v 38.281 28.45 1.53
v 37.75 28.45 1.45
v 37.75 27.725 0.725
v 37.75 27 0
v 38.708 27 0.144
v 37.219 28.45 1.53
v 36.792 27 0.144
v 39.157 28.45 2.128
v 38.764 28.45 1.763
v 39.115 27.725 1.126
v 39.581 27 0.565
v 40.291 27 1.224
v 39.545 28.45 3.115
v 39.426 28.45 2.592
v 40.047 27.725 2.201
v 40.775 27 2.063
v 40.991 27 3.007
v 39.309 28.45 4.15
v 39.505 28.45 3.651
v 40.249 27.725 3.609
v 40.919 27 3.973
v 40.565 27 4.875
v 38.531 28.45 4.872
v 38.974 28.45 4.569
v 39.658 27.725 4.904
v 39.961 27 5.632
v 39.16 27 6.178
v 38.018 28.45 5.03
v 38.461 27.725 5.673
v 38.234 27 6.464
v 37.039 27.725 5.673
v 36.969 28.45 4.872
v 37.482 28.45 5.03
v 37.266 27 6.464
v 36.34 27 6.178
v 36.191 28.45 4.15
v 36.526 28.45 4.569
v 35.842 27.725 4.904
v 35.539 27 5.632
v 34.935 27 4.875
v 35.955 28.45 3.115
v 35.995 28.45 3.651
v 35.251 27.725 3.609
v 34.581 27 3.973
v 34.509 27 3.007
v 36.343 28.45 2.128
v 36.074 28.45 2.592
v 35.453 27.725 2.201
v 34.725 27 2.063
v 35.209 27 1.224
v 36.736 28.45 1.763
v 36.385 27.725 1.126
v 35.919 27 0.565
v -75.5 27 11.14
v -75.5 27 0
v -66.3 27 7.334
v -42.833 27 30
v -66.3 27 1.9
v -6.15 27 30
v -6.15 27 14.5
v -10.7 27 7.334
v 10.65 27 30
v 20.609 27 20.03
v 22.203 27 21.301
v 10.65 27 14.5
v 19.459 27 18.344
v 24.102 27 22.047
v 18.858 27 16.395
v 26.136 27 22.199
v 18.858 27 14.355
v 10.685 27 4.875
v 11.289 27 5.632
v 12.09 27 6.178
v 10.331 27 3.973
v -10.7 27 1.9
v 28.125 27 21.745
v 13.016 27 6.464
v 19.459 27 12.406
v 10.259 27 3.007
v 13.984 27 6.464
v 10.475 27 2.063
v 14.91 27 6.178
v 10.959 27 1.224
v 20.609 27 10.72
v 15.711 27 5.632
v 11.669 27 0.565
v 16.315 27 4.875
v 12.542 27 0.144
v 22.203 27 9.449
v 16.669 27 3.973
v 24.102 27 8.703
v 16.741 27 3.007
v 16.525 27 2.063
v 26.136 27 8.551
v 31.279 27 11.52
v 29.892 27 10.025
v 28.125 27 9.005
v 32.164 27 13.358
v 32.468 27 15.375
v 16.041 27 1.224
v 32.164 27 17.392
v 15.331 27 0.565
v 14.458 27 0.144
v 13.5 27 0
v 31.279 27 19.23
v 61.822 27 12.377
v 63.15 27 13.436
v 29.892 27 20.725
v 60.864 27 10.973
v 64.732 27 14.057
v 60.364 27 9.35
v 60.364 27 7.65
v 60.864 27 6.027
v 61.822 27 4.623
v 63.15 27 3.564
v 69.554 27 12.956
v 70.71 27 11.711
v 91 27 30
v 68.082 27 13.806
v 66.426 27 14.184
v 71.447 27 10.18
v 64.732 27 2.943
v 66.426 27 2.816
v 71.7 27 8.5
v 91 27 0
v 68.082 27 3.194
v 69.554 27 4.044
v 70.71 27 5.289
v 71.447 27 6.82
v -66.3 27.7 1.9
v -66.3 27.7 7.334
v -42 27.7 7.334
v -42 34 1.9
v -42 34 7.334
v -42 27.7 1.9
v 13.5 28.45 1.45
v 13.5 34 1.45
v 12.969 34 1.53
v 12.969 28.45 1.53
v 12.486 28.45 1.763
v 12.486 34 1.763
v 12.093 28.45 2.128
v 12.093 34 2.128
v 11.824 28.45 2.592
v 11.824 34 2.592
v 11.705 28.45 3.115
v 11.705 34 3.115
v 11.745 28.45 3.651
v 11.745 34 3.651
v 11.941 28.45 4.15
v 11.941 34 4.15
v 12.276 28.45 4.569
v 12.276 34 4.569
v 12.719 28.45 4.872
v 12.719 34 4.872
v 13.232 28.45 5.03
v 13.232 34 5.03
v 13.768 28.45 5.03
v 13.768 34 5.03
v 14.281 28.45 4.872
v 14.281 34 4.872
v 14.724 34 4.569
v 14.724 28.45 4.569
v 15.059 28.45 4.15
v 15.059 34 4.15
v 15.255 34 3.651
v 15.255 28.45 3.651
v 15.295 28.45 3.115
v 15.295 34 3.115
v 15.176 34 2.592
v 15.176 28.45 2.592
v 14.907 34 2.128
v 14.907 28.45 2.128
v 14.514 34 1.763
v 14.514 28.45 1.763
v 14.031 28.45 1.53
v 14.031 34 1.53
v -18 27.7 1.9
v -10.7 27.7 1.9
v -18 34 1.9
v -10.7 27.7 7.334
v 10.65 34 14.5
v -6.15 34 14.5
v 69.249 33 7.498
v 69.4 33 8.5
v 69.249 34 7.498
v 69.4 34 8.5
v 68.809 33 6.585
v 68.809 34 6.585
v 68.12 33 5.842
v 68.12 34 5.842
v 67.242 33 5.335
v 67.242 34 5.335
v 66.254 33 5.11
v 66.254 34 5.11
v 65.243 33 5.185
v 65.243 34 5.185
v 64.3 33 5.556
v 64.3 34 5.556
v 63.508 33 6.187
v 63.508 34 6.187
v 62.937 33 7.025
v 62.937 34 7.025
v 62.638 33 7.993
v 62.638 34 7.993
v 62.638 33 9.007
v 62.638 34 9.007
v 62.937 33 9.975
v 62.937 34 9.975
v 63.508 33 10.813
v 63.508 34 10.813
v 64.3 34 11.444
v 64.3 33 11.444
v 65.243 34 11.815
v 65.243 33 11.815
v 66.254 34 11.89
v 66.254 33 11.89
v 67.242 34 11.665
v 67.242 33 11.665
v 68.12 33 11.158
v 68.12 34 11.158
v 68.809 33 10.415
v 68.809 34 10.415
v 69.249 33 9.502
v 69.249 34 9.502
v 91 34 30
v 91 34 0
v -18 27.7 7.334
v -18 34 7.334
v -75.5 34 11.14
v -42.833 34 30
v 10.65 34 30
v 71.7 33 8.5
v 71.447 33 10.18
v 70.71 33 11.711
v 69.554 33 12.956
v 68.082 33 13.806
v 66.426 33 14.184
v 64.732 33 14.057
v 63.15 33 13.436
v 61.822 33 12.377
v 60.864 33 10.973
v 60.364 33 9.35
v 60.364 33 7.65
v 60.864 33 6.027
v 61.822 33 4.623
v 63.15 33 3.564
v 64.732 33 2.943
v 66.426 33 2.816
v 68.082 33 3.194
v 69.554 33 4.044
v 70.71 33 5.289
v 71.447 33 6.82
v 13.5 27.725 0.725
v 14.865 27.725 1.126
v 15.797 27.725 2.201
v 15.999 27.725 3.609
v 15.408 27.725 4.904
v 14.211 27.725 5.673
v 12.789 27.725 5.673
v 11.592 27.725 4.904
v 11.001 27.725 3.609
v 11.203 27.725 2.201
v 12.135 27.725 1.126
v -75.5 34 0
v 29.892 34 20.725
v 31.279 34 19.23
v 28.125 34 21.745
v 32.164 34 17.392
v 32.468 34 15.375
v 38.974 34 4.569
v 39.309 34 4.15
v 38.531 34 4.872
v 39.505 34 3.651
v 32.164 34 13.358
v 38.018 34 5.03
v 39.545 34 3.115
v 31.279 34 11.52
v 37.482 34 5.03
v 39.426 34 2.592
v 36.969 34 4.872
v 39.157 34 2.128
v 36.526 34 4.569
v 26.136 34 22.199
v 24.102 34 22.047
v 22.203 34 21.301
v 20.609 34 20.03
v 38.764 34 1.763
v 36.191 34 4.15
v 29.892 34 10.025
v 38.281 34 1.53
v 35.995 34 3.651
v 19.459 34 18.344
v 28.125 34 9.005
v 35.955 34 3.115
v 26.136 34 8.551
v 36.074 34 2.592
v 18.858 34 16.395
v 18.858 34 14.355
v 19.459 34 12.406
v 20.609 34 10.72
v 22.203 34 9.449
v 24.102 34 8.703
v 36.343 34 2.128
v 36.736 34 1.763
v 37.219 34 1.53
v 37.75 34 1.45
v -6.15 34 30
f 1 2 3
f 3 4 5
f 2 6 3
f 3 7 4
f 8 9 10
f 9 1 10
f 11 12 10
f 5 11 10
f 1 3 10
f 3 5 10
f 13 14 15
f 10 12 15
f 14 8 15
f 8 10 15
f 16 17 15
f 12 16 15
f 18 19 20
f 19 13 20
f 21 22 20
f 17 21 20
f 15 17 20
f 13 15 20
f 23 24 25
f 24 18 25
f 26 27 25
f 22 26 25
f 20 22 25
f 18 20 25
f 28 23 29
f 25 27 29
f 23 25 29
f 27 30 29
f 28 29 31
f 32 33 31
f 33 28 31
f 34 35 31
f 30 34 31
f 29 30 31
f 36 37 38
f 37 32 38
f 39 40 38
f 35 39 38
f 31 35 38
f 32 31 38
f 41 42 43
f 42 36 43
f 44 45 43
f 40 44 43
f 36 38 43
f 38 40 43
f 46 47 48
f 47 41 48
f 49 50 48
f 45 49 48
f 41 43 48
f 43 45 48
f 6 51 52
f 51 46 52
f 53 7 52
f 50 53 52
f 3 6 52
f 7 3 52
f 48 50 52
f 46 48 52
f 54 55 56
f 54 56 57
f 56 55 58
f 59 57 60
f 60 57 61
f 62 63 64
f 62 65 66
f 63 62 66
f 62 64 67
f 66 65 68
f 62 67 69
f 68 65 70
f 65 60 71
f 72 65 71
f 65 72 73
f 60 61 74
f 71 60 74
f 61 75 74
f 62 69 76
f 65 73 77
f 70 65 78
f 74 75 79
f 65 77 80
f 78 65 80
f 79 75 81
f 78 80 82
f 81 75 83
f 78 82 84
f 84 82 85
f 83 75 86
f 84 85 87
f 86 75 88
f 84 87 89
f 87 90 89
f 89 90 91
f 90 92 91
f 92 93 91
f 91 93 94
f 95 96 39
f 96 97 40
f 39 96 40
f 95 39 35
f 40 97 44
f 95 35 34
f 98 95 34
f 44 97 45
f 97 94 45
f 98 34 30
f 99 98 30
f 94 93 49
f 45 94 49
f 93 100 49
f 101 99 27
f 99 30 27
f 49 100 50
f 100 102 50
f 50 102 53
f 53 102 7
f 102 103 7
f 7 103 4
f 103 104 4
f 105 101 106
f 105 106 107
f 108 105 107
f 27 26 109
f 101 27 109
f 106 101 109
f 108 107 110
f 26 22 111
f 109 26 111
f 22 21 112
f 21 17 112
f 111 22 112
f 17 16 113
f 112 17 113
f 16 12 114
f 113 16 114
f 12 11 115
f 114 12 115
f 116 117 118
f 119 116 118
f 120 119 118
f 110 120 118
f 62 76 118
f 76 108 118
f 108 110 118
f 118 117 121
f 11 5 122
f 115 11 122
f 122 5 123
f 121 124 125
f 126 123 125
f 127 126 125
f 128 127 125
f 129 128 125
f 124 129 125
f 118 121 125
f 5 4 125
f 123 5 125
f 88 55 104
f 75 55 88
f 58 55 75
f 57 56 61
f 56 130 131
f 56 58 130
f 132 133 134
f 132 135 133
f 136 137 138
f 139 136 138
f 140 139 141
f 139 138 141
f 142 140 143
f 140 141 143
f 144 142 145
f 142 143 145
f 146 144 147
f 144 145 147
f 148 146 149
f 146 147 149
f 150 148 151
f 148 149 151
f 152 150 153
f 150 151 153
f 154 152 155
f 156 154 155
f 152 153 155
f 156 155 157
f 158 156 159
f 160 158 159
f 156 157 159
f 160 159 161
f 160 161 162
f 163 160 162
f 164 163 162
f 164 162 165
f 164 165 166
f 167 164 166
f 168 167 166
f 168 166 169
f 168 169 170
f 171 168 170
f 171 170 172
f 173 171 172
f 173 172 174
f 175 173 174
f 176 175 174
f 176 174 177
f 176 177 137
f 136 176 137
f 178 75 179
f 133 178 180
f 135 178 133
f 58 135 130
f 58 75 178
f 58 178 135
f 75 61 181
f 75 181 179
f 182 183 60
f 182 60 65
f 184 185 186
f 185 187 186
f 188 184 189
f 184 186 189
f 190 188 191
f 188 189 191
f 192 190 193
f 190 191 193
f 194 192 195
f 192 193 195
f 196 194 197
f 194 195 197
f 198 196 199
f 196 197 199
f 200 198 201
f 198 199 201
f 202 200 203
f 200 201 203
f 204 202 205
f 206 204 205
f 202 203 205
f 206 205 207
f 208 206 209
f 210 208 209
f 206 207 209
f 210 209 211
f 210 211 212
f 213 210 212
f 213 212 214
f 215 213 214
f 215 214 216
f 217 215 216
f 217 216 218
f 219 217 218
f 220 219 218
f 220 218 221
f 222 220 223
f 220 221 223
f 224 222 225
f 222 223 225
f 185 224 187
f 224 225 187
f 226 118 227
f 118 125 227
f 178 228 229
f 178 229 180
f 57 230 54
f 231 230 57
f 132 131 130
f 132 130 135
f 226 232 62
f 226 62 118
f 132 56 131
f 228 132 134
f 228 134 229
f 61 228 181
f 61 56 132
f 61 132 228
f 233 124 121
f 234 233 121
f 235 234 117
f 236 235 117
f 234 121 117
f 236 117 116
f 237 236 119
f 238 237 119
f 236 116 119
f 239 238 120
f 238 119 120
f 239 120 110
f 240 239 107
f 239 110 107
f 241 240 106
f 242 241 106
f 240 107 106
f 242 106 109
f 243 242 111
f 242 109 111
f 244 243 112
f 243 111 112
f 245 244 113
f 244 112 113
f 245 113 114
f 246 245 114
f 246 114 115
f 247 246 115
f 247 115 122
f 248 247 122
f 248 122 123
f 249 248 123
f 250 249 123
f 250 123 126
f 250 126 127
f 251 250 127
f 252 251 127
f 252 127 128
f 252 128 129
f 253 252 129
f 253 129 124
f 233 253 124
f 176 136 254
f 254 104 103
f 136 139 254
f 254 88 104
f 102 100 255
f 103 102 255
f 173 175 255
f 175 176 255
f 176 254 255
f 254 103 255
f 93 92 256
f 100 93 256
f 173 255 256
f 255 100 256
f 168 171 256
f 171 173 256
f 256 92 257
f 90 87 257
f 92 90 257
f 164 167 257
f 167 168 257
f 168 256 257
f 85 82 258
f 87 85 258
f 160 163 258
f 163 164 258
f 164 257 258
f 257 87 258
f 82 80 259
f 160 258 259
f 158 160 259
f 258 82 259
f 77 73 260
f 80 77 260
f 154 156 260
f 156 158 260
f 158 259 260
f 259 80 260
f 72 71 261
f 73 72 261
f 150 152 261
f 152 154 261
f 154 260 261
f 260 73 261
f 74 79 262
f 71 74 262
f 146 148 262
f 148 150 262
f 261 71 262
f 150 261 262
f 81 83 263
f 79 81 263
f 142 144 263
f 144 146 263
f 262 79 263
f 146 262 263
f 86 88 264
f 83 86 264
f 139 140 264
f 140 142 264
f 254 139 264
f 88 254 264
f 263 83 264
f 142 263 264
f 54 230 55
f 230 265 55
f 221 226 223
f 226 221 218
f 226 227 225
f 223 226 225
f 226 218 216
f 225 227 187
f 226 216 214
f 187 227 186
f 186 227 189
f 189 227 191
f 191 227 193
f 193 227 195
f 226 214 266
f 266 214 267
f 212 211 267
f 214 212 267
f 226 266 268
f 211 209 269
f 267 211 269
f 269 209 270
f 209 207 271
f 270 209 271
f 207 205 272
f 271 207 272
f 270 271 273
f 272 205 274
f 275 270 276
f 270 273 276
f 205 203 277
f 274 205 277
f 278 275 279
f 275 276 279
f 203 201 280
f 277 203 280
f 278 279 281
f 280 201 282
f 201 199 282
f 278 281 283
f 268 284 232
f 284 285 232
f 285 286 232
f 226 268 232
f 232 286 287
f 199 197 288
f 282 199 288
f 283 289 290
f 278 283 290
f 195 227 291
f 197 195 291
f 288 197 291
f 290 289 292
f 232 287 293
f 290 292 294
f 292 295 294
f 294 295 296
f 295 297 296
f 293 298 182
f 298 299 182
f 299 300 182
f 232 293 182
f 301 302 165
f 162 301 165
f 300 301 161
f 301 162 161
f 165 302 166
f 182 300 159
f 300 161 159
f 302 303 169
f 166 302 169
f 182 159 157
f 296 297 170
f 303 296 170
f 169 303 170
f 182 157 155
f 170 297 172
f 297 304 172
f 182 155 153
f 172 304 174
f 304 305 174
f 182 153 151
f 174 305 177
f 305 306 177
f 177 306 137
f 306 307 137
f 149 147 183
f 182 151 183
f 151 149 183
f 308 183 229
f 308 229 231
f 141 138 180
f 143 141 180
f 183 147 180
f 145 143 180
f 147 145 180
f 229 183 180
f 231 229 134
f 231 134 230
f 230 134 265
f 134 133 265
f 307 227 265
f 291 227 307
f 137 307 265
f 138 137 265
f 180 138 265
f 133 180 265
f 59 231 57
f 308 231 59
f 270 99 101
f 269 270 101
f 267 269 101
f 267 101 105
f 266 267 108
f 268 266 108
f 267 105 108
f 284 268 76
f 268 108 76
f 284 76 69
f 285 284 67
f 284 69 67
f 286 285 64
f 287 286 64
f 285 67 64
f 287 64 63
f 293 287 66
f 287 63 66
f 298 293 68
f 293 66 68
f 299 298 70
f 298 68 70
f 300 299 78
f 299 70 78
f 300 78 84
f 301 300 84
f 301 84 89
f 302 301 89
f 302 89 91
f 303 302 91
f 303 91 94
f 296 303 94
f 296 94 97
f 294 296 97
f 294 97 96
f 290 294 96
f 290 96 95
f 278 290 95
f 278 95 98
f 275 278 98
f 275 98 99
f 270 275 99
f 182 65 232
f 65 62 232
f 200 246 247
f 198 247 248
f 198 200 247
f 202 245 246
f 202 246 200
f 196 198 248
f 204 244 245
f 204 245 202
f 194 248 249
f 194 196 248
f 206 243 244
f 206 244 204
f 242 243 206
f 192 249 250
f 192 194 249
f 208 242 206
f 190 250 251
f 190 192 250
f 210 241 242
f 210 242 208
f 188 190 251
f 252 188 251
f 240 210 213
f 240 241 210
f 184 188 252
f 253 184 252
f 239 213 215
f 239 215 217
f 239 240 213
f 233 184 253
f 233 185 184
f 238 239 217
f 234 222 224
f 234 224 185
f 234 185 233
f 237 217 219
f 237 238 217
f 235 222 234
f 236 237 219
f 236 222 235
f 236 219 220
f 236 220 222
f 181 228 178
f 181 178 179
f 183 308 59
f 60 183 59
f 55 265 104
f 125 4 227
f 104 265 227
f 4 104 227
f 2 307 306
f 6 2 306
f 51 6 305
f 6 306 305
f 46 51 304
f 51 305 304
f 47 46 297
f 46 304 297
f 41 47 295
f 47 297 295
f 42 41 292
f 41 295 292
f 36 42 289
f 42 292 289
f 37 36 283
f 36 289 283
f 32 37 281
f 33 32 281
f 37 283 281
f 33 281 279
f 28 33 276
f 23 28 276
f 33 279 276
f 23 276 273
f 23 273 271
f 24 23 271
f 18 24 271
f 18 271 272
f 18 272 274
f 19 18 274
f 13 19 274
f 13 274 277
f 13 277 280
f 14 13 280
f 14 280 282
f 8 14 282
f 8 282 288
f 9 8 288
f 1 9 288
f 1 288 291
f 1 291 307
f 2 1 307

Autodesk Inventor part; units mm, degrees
ref_plane "YZ Plane" through (0, 0, 0) normal (1, 0, 0) x (0, 1, 0)
ref_plane "XZ Plane" through (0, 0, 0) normal (0, 1, 0) x (-1, 0, 0)
ref_plane "XY Plane" through (0, 0, 0) normal (0, 0, 1) x (1, 0, 0)
sketch "Sketch1" plane through (0, 0, 0) normal (0, 0, 1) x (1, 0, 0)
  line L0 (91, -34) -> (91, 34) projected
  line L1 (91, 34) -> (41, 34) projected
  line L2 (41, 34) -> (41, 89) projected
  line L3 (41, 89) -> (-91, 89) projected
  line L4 (-91, 89) -> (-91, -89) projected
  line L5 (-91, -89) -> (41, -89) projected
  line L6 (41, -89) -> (41, -34) projected
  line L7 (41, -34) -> (91, -34) projected
  line L8 (70, 27) -> (62, 27) projected
  line L9 (91, 34) -> (-87, 34)
  line L10 (-87, 34) -> (-87, 27)
  line L11 (-87, 27) -> (91, 27)
  line L12 (91, 27) -> (91, 34)
  circle A0 centre (-83, 21.5) radius 1.2295 projected
  circle A1 centre (-83, -64.5) radius 1.2295 projected
  circle A2 centre (-83, -21.5) radius 1.2295 projected
  circle A3 centre (-83, 64.5) radius 1.2295 projected
  line L13 (-85, -72) -> (-76, -72) projected
  line L14 (-76, -72) -> (-76, -57) projected
  line L15 (-76, -57) -> (-85, -57) projected
  arc A4 (-87, -55) -> (-85, -57) centre (-85, -55) ccw projected
  line L16 (-87, -55) -> (-87, -31) projected
  arc A5 (-85, -29) -> (-87, -31) centre (-85, -31) ccw projected
  line L17 (-85, -29) -> (-76, -29) projected
  line L18 (-76, -29) -> (-76, -14) projected
  line L19 (-76, -14) -> (-85, -14) projected
  arc A6 (-87, -12) -> (-85, -14) centre (-85, -12) ccw projected
  line L20 (-87, -12) -> (-87, 12) projected
  arc A7 (-85, 14) -> (-87, 12) centre (-85, 12) ccw projected
  line L21 (-85, 14) -> (-76, 14) projected
  line L22 (-76, 14) -> (-76, 29) projected
  line L23 (-76, 29) -> (-85, 29) projected
  arc A8 (-87, 31) -> (-85, 29) centre (-85, 31) ccw projected
  line L24 (-87, 31) -> (-87, 55) projected
  arc A9 (-85, 57) -> (-87, 55) centre (-85, 55) ccw projected
  line L25 (-85, 57) -> (-76, 57) projected
  line L26 (-76, 57) -> (-76, 72) projected
  line L27 (-76, 72) -> (-85, 72) projected
  arc A10 (-87, 74) -> (-85, 72) centre (-85, 74) ccw projected
  line L28 (-87, 74) -> (-87, 89) projected
  line L29 (-91, 89) -> (-87, 89) projected
  line L30 (-91, -89) -> (-91, 89) projected
  line L31 (-91, -89) -> (-87, -89) projected
  line L32 (-87, -89) -> (-87, -74) projected
  arc A11 (-85, -72) -> (-87, -74) centre (-85, -74) ccw projected
  line L33 (-91, 89.5) -> (-86.5, 89.5)
  line L34 (-86.5, 89.5) -> (-86.5, 74)
  arc A12 (-86.5, 74) -> (-85, 72.5) centre (-85, 74) ccw
  line L35 (-85, 72.5) -> (-75.5, 72.5)
  line L36 (-75.5, 72.5) -> (-75.5, 56.5)
  line L37 (-75.5, 56.5) -> (-85, 56.5)
  arc A13 (-85, 56.5) -> (-86.5, 55) centre (-85, 55) ccw
  line L38 (-86.5, 55) -> (-86.5, 31)
  arc A14 (-86.5, 31) -> (-85, 29.5) centre (-85, 31) ccw
  line L39 (-85, 29.5) -> (-75.5, 29.5)
  line L40 (-75.5, 29.5) -> (-75.5, 13.5)
  line L41 (-75.5, 13.5) -> (-85, 13.5)
  arc A15 (-85, 13.5) -> (-86.5, 12) centre (-85, 12) ccw
  line L42 (-86.5, 12) -> (-86.5, -12)
  arc A16 (-86.5, -12) -> (-85, -13.5) centre (-85, -12) ccw
  line L43 (-85, -13.5) -> (-75.5, -13.5)
  line L44 (-75.5, -13.5) -> (-75.5, -29.5)
  line L45 (-75.5, -29.5) -> (-85, -29.5)
  arc A17 (-85, -29.5) -> (-86.5, -31) centre (-85, -31) ccw
  line L46 (-86.5, -31) -> (-86.5, -55)
  arc A18 (-86.5, -55) -> (-85, -56.5) centre (-85, -55) ccw
  line L47 (-85, -56.5) -> (-75.5, -56.5)
  line L48 (-75.5, -56.5) -> (-75.5, -72.5)
  line L49 (-75.5, -72.5) -> (-85, -72.5)
  arc A19 (-85, -72.5) -> (-86.5, -74) centre (-85, -74) ccw
  line L50 (-86.5, -74) -> (-86.5, -89.5)
  line L51 (-86.5, -89.5) -> (-91, -89.5)
  line L52 (-86.5, 31) -> (-75.5, 31)
  line L53 (-75.5, 31) -> (-75.5, 29.5)
  line L54 (-75.5, 31) -> (-75.5, 34)
  point P0 (0, 0)
  point P1 (-75.5, 27)
  point P2 (-86.5, 34)
  dimension "d6" = 0.5
extrude "Extrusion1" add sketch "Sketch1" along normal blind 30 contours L11 L8 L40 L53 L54 L9 L1 L0
sketch "Sketch3" plane through (-86.5, 34, 0) normal (0, 1, 0) x (1, 0, 0)
  line L0 (-0.5, -4.5) -> (-0.5, 0) projected
  line L1 (-0.5, 0) -> (-4.5, 0) projected
  line L2 (-4.5, 0) -> (-4.5, 3.5) projected
  line L3 (-4.5, 3.5) -> (-18.5, 3.5) projected
  line L4 (-18.5, 3.5) -> (-4.5, -5.5) projected
  line L5 (-4.5, -5.5) -> (-4.5, -4.5) projected
  line L6 (-4.5, -4.5) -> (-0.5, -4.5) projected
  line L7 (-0.5, -4.5) -> (50.0525, -33.6865)
  line L8 (177.5, 0) -> (11, 0) projected
  line L9 (177.5, -30) -> (11, -30) projected
  line L10 (177.5, 0) -> (177.5, -30) projected
  line L11 (11, 0) -> (11, -30) projected
  point P0 (86.5, 0)
  point P1 (43.6673, -30)
  point P2 (11, -11.1395)
  dimension "d7" = 30
extrude "Extrusion4" cut sketch "Sketch3" against normal blind 30 contours L7 L9 L11
sketch "Sketch5" plane through (-75.5, 27, 0) normal (0, -1, 0) x (1, 0, 0)
  line L0 (56.5, 7.0341) -> (57.5, 7.0341) projected
  line L1 (34.5, 7.0341) -> (56.5, 7.0341) projected
  line L2 (33.5, 7.0341) -> (33.5, 6.6226)
  line L3 (33.5, 6.6226) -> (9.5, 6.6226)
  line L4 (9.5, 6.6226) -> (9.5, 7.0341)
  line L5 (9.5, 7.0341) -> (33.5, 7.0341)
  line L6 (64.5, 7.0341) -> (64.5, 6.6226)
  line L7 (64.5, 6.6226) -> (57.5, 6.6226)
  line L8 (57.5, 6.6226) -> (57.5, 7.0341)
  line L9 (57.5, 7.0341) -> (64.5, 7.0341)
  line L10 (9.5, 2) -> (9.5, 2.6226)
  line L11 (9.5, 2.6226) -> (64.5, 2.6226)
  line L12 (64.5, 2.6226) -> (64.5, 2)
  line L13 (64.5, 2) -> (9.5, 2)
  line L14 (9.5, 7.0341) -> (64.5, 7.0341)
  line L15 (64.5, 7.0341) -> (64.5, 2)
  line L16 (64.5, 2) -> (9.5, 2)
  line L17 (9.5, 2) -> (9.5, 7.0341)
  line L18 (9.2, 7.3341) -> (64.8, 7.3341)
  line L19 (64.8, 7.3341) -> (64.8, 1.9)
  line L20 (64.8, 1.9) -> (9.2, 1.9)
  line L21 (9.2, 1.9) -> (9.2, 7.3341)
  point P0 (75.5, 0)
  dimension "d19" = 0.3
  dimension "d20" = 0.3
  dimension "d21" = 0.1
  dimension "d22" = 0.3
extrude "Extrusion6" cut sketch "Sketch5" against normal blind 0.7 contours L0 L8 L7 L15 L11 L17 L3 L2 L14 L1 | L9 L6 L7 L8 | L2 L3 L4 L5 | L12 L13 L10 L11 | L18 L19 L20 L21
sketch "Sketch6" plane through (-75.5, 27, 0) normal (0, -1, 0) x (1, 0, 0)
  line L0 (33.5, 7.0341) -> (34.5, 7.0341) projected
  line L1 (34.5, 7.0341) -> (56.5, 7.0341) projected
  line L2 (56.5, 7.0341) -> (57.5, 7.0341) projected
  line L3 (64.8, 1.9) -> (9.2, 1.9) projected
  line L4 (64.8, 7.3341) -> (64.8, 1.9) projected
  line L5 (9.2, 7.3341) -> (64.8, 7.3341) projected
  line L6 (9.2, 1.9) -> (9.2, 7.3341) projected
  line L7 (33.5, 7.3341) -> (57.5, 7.3341)
  line L8 (57.5, 7.3341) -> (57.5, 1.9)
  line L9 (57.5, 1.9) -> (33.5, 1.9)
  line L10 (33.5, 1.9) -> (33.5, 7.3341)
  point P0 (75.5, 0)
extrude "Extrusion7" cut sketch "Sketch6" against normal up to next contours L10 L5 L8 L2 L1 L0 | L0 L1 L2 L8 L3 L10
sketch "Sketch7" plane through (0, 0, 30) normal (0, 0, 1) x (1, 0, 0)
  line L0 (10.25, -34) -> (10.25, 34) projected
  line L1 (10.25, 34) -> (-5.75, 34) projected
  line L2 (-5.75, -34) -> (-5.75, 34) projected
  line L3 (10.25, -34) -> (-5.75, -34) projected
  line L4 (-42.8327, 27) -> (91, 27) projected
  line L5 (10.25, 34) -> (-5.75, 34)
  line L6 (-5.75, 34) -> (-5.75, 27)
  line L7 (-5.75, 27) -> (10.25, 27)
  line L8 (10.25, 27) -> (10.25, 34)
  line L9 (10.65, 34) -> (-6.15, 34)
  line L10 (-6.15, 34) -> (-6.15, 27)
  line L11 (-6.15, 27) -> (10.65, 27)
  line L12 (10.65, 27) -> (10.65, 34)
  point P0 (0, 0)
  dimension "d27" = 0.4
  dimension "d28" = 0.4
extrude "Extrusion8" cut sketch "Sketch7" against normal blind 15.5 contours L4 L2 L1 L0 | L0 L9 L12 L4 | L4 L10 L9 L2
sketch "Sketch8" plane through (-75.5, 27, 0) normal (0, -1, 0) x (1, 0, 0)
  circle A0 centre (89, 3.25) radius 1.8 projected
  circle A1 centre (113.25, 3.25) radius 1.8 projected
  point P0 (75.5, 0)
hole "Hole1" at (13.5, 27, 3.25) at (37.75, 27, 3.25) direction (0, 1, 0) diameter 3.6 end through all countersink diameter 6.5 countersink angle 90 clearance for "Countersunk Flat Head Screw ISO 2009/7046" size "M3" standard "ISO"
sketch "Sketch9" plane through (91, 27, 0) normal (0, -1, 0) x (1, 0, 0)
  arc A0 (-67.8175, 18.3693) -> (-69.7313, 19.2694) centre (-70.7618, 14.5935) ccw projected
  arc A1 (-69.7313, 19.2694) -> (-70.2869, 18.54) centre (-65.375, 15.375) ccw projected
  arc A2 (-70.2869, 18.54) -> (-68.9106, 16.9341) centre (-66.053, 20.7758) ccw projected
  arc A3 (-68.9106, 16.9341) -> (-69.111, 16.3618) centre (-65.375, 15.375) ccw projected
  arc A4 (-69.111, 16.3618) -> (-71.1884, 15.965) centre (-69.2737, 11.5765) ccw projected
  arc A5 (-71.1884, 15.965) -> (-71.2091, 15.0484) centre (-65.375, 15.375) ccw projected
  arc A6 (-71.2091, 15.0484) -> (-69.1518, 14.5581) centre (-69.098, 19.3459) ccw projected
  arc A7 (-69.1518, 14.5581) -> (-68.9775, 13.9774) centre (-65.375, 15.375) ccw projected
  arc A8 (-68.9775, 13.9774) -> (-70.425, 12.4353) centre (-66.2964, 10.0103) ccw projected
  arc A9 (-70.425, 12.4353) -> (-69.9029, 11.6815) centre (-65.375, 15.375) ccw projected
  arc A10 (-69.9029, 11.6815) -> (-67.9503, 12.4942) centre (-70.721, 16.3992) ccw projected
  arc A11 (-67.9503, 12.4942) -> (-67.468, 12.1268) centre (-65.375, 15.375) ccw projected
  arc A12 (-67.468, 12.1268) -> (-67.7326, 10.0285) centre (-62.9672, 10.4933) ccw projected
  arc A13 (-67.7326, 10.0285) -> (-66.8672, 9.7255) centre (-65.375, 15.375) ccw projected
  arc A14 (-66.8672, 9.7255) -> (-65.7652, 11.5306) centre (-70.302, 13.0613) ccw projected
  arc A15 (-65.7652, 11.5306) -> (-65.159, 11.5169) centre (-65.375, 15.375) ccw projected
  arc A16 (-65.159, 11.5169) -> (-64.1397, 9.6638) centre (-60.5576, 12.8409) ccw projected
  arc A17 (-64.1397, 9.6638) -> (-63.2615, 9.9273) centre (-65.375, 15.375) ccw projected
  arc A18 (-63.2615, 9.9273) -> (-63.431, 12.0355) centre (-68.0011, 10.6071) ccw projected
  arc A19 (-63.431, 12.0355) -> (-62.9325, 12.3807) centre (-65.375, 15.375) ccw projected
  arc A20 (-62.9325, 12.3807) -> (-61.0187, 11.4806) centre (-59.9882, 16.1565) ccw projected
  arc A21 (-61.0187, 11.4806) -> (-60.4631, 12.21) centre (-65.375, 15.375) ccw projected
  arc A22 (-60.4631, 12.21) -> (-61.8394, 13.8159) centre (-64.697, 9.9742) ccw projected
  arc A23 (-61.8394, 13.8159) -> (-61.639, 14.3882) centre (-65.375, 15.375) ccw projected
  arc A24 (-61.639, 14.3882) -> (-59.5616, 14.785) centre (-61.4763, 19.1735) ccw projected
  arc A25 (-59.5616, 14.785) -> (-59.5409, 15.7016) centre (-65.375, 15.375) ccw projected
  arc A26 (-59.5409, 15.7016) -> (-61.5982, 16.1919) centre (-61.652, 11.4041) ccw projected
  arc A27 (-61.5982, 16.1919) -> (-61.7725, 16.7726) centre (-65.375, 15.375) ccw projected
  arc A28 (-61.7725, 16.7726) -> (-60.325, 18.3147) centre (-64.4536, 20.7397) ccw projected
  arc A29 (-60.325, 18.3147) -> (-60.8471, 19.0685) centre (-65.375, 15.375) ccw projected
  arc A30 (-60.8471, 19.0685) -> (-62.7997, 18.2558) centre (-60.029, 14.3508) ccw projected
  arc A31 (-62.7997, 18.2558) -> (-63.282, 18.6232) centre (-65.375, 15.375) ccw projected
  arc A32 (-63.282, 18.6232) -> (-63.0174, 20.7215) centre (-67.7828, 20.2567) ccw projected
  arc A33 (-63.0174, 20.7215) -> (-63.8828, 21.0245) centre (-65.375, 15.375) ccw projected
  arc A34 (-63.8828, 21.0245) -> (-64.9848, 19.2194) centre (-60.448, 17.6887) ccw projected
  arc A35 (-64.9848, 19.2194) -> (-65.591, 19.2331) centre (-65.375, 15.375) ccw projected
  arc A36 (-65.591, 19.2331) -> (-66.6103, 21.0862) centre (-70.1924, 17.9091) ccw projected
  arc A37 (-66.6103, 21.0862) -> (-67.4885, 20.8227) centre (-65.375, 15.375) ccw projected
  arc A38 (-67.4885, 20.8227) -> (-67.319, 18.7145) centre (-62.7489, 20.1429) ccw projected
  arc A39 (-67.319, 18.7145) -> (-67.8175, 18.3693) centre (-65.375, 15.375) ccw projected
  circle A40 centre (-65.375, 15.375) radius 5.8433
  circle A41 centre (-65.375, 15.375) radius 6.8433
  circle A42 centre (-25, 8.5) radius 5.5 projected
  point P0 (-91, 0)
  dimension "d38" = 1
extrude "Extrusion9" cut sketch "Sketch9" against normal up to next contours A39 A38 A37 A36 A35 A34 A33 A32 A31 A30 A29 A28 A27 A26 A25 A24 A23 A22 A21 A20 A19 A18 A17 A16 A15 A14 A13 A12 A11 A10 A9 A8 A7 A6 A5 A4 A3 A2 A1 A0 | A0 A40 A38 A39 | A2 A3 A4 A40 | A40 A34 A35 A36 | A6 A7 A8 A40 | A40 A30 A31 A32 | A10 A11 A12 A40 | A40 A26 A27 A28 | A14 A15 A16 A40 | A18 A19 A20 A40 | A40 A22 A23 A24 | A41
sketch "Sketch10" plane through (91, 27, 0) normal (0, -1, 0) x (1, 0, 0)
  circle A0 centre (-25, 8.5) radius 5.5 projected
  circle A1 centre (-25, 8.5) radius 5.7
  point P0 (-91, 0)
  dimension "d41" = 0.2
extrude "Extrusion10" cut sketch "Sketch10" against normal blind 6 contours A0 | A1
sketch "Sketch11" plane through (-75.5, 34, 0) normal (0, 1, 0) x (1, 0, 0)
  circle A0 centre (141.5, -8.5) radius 1.2295 projected
  line L0 (143.8461, -6.6303) -> (139.813, -6.0193) projected
  arc A1 (139.813, -6.0193) -> (139.1539, -10.3697) centre (141.5, -8.5) ccw projected
  line L1 (139.1539, -10.3697) -> (143.187, -10.9807) projected
  arc A2 (143.187, -10.9807) -> (143.8461, -6.6303) centre (141.5, -8.5) ccw projected
  circle A3 centre (141.5, -8.5) radius 5.7 projected
  circle A4 centre (141.5, -8.5) radius 3
  circle A5 centre (141.5, -8.5) radius 3.4
  point P0 (75.5, 0)
  dimension "d44" = 0.4
extrude "Extrusion11" cut sketch "Sketch11" against normal blind 6 contours A0 | A2 L1 A1 L0 | L0 A4 | L1 A4 | A5
properties part number "right_hold"
